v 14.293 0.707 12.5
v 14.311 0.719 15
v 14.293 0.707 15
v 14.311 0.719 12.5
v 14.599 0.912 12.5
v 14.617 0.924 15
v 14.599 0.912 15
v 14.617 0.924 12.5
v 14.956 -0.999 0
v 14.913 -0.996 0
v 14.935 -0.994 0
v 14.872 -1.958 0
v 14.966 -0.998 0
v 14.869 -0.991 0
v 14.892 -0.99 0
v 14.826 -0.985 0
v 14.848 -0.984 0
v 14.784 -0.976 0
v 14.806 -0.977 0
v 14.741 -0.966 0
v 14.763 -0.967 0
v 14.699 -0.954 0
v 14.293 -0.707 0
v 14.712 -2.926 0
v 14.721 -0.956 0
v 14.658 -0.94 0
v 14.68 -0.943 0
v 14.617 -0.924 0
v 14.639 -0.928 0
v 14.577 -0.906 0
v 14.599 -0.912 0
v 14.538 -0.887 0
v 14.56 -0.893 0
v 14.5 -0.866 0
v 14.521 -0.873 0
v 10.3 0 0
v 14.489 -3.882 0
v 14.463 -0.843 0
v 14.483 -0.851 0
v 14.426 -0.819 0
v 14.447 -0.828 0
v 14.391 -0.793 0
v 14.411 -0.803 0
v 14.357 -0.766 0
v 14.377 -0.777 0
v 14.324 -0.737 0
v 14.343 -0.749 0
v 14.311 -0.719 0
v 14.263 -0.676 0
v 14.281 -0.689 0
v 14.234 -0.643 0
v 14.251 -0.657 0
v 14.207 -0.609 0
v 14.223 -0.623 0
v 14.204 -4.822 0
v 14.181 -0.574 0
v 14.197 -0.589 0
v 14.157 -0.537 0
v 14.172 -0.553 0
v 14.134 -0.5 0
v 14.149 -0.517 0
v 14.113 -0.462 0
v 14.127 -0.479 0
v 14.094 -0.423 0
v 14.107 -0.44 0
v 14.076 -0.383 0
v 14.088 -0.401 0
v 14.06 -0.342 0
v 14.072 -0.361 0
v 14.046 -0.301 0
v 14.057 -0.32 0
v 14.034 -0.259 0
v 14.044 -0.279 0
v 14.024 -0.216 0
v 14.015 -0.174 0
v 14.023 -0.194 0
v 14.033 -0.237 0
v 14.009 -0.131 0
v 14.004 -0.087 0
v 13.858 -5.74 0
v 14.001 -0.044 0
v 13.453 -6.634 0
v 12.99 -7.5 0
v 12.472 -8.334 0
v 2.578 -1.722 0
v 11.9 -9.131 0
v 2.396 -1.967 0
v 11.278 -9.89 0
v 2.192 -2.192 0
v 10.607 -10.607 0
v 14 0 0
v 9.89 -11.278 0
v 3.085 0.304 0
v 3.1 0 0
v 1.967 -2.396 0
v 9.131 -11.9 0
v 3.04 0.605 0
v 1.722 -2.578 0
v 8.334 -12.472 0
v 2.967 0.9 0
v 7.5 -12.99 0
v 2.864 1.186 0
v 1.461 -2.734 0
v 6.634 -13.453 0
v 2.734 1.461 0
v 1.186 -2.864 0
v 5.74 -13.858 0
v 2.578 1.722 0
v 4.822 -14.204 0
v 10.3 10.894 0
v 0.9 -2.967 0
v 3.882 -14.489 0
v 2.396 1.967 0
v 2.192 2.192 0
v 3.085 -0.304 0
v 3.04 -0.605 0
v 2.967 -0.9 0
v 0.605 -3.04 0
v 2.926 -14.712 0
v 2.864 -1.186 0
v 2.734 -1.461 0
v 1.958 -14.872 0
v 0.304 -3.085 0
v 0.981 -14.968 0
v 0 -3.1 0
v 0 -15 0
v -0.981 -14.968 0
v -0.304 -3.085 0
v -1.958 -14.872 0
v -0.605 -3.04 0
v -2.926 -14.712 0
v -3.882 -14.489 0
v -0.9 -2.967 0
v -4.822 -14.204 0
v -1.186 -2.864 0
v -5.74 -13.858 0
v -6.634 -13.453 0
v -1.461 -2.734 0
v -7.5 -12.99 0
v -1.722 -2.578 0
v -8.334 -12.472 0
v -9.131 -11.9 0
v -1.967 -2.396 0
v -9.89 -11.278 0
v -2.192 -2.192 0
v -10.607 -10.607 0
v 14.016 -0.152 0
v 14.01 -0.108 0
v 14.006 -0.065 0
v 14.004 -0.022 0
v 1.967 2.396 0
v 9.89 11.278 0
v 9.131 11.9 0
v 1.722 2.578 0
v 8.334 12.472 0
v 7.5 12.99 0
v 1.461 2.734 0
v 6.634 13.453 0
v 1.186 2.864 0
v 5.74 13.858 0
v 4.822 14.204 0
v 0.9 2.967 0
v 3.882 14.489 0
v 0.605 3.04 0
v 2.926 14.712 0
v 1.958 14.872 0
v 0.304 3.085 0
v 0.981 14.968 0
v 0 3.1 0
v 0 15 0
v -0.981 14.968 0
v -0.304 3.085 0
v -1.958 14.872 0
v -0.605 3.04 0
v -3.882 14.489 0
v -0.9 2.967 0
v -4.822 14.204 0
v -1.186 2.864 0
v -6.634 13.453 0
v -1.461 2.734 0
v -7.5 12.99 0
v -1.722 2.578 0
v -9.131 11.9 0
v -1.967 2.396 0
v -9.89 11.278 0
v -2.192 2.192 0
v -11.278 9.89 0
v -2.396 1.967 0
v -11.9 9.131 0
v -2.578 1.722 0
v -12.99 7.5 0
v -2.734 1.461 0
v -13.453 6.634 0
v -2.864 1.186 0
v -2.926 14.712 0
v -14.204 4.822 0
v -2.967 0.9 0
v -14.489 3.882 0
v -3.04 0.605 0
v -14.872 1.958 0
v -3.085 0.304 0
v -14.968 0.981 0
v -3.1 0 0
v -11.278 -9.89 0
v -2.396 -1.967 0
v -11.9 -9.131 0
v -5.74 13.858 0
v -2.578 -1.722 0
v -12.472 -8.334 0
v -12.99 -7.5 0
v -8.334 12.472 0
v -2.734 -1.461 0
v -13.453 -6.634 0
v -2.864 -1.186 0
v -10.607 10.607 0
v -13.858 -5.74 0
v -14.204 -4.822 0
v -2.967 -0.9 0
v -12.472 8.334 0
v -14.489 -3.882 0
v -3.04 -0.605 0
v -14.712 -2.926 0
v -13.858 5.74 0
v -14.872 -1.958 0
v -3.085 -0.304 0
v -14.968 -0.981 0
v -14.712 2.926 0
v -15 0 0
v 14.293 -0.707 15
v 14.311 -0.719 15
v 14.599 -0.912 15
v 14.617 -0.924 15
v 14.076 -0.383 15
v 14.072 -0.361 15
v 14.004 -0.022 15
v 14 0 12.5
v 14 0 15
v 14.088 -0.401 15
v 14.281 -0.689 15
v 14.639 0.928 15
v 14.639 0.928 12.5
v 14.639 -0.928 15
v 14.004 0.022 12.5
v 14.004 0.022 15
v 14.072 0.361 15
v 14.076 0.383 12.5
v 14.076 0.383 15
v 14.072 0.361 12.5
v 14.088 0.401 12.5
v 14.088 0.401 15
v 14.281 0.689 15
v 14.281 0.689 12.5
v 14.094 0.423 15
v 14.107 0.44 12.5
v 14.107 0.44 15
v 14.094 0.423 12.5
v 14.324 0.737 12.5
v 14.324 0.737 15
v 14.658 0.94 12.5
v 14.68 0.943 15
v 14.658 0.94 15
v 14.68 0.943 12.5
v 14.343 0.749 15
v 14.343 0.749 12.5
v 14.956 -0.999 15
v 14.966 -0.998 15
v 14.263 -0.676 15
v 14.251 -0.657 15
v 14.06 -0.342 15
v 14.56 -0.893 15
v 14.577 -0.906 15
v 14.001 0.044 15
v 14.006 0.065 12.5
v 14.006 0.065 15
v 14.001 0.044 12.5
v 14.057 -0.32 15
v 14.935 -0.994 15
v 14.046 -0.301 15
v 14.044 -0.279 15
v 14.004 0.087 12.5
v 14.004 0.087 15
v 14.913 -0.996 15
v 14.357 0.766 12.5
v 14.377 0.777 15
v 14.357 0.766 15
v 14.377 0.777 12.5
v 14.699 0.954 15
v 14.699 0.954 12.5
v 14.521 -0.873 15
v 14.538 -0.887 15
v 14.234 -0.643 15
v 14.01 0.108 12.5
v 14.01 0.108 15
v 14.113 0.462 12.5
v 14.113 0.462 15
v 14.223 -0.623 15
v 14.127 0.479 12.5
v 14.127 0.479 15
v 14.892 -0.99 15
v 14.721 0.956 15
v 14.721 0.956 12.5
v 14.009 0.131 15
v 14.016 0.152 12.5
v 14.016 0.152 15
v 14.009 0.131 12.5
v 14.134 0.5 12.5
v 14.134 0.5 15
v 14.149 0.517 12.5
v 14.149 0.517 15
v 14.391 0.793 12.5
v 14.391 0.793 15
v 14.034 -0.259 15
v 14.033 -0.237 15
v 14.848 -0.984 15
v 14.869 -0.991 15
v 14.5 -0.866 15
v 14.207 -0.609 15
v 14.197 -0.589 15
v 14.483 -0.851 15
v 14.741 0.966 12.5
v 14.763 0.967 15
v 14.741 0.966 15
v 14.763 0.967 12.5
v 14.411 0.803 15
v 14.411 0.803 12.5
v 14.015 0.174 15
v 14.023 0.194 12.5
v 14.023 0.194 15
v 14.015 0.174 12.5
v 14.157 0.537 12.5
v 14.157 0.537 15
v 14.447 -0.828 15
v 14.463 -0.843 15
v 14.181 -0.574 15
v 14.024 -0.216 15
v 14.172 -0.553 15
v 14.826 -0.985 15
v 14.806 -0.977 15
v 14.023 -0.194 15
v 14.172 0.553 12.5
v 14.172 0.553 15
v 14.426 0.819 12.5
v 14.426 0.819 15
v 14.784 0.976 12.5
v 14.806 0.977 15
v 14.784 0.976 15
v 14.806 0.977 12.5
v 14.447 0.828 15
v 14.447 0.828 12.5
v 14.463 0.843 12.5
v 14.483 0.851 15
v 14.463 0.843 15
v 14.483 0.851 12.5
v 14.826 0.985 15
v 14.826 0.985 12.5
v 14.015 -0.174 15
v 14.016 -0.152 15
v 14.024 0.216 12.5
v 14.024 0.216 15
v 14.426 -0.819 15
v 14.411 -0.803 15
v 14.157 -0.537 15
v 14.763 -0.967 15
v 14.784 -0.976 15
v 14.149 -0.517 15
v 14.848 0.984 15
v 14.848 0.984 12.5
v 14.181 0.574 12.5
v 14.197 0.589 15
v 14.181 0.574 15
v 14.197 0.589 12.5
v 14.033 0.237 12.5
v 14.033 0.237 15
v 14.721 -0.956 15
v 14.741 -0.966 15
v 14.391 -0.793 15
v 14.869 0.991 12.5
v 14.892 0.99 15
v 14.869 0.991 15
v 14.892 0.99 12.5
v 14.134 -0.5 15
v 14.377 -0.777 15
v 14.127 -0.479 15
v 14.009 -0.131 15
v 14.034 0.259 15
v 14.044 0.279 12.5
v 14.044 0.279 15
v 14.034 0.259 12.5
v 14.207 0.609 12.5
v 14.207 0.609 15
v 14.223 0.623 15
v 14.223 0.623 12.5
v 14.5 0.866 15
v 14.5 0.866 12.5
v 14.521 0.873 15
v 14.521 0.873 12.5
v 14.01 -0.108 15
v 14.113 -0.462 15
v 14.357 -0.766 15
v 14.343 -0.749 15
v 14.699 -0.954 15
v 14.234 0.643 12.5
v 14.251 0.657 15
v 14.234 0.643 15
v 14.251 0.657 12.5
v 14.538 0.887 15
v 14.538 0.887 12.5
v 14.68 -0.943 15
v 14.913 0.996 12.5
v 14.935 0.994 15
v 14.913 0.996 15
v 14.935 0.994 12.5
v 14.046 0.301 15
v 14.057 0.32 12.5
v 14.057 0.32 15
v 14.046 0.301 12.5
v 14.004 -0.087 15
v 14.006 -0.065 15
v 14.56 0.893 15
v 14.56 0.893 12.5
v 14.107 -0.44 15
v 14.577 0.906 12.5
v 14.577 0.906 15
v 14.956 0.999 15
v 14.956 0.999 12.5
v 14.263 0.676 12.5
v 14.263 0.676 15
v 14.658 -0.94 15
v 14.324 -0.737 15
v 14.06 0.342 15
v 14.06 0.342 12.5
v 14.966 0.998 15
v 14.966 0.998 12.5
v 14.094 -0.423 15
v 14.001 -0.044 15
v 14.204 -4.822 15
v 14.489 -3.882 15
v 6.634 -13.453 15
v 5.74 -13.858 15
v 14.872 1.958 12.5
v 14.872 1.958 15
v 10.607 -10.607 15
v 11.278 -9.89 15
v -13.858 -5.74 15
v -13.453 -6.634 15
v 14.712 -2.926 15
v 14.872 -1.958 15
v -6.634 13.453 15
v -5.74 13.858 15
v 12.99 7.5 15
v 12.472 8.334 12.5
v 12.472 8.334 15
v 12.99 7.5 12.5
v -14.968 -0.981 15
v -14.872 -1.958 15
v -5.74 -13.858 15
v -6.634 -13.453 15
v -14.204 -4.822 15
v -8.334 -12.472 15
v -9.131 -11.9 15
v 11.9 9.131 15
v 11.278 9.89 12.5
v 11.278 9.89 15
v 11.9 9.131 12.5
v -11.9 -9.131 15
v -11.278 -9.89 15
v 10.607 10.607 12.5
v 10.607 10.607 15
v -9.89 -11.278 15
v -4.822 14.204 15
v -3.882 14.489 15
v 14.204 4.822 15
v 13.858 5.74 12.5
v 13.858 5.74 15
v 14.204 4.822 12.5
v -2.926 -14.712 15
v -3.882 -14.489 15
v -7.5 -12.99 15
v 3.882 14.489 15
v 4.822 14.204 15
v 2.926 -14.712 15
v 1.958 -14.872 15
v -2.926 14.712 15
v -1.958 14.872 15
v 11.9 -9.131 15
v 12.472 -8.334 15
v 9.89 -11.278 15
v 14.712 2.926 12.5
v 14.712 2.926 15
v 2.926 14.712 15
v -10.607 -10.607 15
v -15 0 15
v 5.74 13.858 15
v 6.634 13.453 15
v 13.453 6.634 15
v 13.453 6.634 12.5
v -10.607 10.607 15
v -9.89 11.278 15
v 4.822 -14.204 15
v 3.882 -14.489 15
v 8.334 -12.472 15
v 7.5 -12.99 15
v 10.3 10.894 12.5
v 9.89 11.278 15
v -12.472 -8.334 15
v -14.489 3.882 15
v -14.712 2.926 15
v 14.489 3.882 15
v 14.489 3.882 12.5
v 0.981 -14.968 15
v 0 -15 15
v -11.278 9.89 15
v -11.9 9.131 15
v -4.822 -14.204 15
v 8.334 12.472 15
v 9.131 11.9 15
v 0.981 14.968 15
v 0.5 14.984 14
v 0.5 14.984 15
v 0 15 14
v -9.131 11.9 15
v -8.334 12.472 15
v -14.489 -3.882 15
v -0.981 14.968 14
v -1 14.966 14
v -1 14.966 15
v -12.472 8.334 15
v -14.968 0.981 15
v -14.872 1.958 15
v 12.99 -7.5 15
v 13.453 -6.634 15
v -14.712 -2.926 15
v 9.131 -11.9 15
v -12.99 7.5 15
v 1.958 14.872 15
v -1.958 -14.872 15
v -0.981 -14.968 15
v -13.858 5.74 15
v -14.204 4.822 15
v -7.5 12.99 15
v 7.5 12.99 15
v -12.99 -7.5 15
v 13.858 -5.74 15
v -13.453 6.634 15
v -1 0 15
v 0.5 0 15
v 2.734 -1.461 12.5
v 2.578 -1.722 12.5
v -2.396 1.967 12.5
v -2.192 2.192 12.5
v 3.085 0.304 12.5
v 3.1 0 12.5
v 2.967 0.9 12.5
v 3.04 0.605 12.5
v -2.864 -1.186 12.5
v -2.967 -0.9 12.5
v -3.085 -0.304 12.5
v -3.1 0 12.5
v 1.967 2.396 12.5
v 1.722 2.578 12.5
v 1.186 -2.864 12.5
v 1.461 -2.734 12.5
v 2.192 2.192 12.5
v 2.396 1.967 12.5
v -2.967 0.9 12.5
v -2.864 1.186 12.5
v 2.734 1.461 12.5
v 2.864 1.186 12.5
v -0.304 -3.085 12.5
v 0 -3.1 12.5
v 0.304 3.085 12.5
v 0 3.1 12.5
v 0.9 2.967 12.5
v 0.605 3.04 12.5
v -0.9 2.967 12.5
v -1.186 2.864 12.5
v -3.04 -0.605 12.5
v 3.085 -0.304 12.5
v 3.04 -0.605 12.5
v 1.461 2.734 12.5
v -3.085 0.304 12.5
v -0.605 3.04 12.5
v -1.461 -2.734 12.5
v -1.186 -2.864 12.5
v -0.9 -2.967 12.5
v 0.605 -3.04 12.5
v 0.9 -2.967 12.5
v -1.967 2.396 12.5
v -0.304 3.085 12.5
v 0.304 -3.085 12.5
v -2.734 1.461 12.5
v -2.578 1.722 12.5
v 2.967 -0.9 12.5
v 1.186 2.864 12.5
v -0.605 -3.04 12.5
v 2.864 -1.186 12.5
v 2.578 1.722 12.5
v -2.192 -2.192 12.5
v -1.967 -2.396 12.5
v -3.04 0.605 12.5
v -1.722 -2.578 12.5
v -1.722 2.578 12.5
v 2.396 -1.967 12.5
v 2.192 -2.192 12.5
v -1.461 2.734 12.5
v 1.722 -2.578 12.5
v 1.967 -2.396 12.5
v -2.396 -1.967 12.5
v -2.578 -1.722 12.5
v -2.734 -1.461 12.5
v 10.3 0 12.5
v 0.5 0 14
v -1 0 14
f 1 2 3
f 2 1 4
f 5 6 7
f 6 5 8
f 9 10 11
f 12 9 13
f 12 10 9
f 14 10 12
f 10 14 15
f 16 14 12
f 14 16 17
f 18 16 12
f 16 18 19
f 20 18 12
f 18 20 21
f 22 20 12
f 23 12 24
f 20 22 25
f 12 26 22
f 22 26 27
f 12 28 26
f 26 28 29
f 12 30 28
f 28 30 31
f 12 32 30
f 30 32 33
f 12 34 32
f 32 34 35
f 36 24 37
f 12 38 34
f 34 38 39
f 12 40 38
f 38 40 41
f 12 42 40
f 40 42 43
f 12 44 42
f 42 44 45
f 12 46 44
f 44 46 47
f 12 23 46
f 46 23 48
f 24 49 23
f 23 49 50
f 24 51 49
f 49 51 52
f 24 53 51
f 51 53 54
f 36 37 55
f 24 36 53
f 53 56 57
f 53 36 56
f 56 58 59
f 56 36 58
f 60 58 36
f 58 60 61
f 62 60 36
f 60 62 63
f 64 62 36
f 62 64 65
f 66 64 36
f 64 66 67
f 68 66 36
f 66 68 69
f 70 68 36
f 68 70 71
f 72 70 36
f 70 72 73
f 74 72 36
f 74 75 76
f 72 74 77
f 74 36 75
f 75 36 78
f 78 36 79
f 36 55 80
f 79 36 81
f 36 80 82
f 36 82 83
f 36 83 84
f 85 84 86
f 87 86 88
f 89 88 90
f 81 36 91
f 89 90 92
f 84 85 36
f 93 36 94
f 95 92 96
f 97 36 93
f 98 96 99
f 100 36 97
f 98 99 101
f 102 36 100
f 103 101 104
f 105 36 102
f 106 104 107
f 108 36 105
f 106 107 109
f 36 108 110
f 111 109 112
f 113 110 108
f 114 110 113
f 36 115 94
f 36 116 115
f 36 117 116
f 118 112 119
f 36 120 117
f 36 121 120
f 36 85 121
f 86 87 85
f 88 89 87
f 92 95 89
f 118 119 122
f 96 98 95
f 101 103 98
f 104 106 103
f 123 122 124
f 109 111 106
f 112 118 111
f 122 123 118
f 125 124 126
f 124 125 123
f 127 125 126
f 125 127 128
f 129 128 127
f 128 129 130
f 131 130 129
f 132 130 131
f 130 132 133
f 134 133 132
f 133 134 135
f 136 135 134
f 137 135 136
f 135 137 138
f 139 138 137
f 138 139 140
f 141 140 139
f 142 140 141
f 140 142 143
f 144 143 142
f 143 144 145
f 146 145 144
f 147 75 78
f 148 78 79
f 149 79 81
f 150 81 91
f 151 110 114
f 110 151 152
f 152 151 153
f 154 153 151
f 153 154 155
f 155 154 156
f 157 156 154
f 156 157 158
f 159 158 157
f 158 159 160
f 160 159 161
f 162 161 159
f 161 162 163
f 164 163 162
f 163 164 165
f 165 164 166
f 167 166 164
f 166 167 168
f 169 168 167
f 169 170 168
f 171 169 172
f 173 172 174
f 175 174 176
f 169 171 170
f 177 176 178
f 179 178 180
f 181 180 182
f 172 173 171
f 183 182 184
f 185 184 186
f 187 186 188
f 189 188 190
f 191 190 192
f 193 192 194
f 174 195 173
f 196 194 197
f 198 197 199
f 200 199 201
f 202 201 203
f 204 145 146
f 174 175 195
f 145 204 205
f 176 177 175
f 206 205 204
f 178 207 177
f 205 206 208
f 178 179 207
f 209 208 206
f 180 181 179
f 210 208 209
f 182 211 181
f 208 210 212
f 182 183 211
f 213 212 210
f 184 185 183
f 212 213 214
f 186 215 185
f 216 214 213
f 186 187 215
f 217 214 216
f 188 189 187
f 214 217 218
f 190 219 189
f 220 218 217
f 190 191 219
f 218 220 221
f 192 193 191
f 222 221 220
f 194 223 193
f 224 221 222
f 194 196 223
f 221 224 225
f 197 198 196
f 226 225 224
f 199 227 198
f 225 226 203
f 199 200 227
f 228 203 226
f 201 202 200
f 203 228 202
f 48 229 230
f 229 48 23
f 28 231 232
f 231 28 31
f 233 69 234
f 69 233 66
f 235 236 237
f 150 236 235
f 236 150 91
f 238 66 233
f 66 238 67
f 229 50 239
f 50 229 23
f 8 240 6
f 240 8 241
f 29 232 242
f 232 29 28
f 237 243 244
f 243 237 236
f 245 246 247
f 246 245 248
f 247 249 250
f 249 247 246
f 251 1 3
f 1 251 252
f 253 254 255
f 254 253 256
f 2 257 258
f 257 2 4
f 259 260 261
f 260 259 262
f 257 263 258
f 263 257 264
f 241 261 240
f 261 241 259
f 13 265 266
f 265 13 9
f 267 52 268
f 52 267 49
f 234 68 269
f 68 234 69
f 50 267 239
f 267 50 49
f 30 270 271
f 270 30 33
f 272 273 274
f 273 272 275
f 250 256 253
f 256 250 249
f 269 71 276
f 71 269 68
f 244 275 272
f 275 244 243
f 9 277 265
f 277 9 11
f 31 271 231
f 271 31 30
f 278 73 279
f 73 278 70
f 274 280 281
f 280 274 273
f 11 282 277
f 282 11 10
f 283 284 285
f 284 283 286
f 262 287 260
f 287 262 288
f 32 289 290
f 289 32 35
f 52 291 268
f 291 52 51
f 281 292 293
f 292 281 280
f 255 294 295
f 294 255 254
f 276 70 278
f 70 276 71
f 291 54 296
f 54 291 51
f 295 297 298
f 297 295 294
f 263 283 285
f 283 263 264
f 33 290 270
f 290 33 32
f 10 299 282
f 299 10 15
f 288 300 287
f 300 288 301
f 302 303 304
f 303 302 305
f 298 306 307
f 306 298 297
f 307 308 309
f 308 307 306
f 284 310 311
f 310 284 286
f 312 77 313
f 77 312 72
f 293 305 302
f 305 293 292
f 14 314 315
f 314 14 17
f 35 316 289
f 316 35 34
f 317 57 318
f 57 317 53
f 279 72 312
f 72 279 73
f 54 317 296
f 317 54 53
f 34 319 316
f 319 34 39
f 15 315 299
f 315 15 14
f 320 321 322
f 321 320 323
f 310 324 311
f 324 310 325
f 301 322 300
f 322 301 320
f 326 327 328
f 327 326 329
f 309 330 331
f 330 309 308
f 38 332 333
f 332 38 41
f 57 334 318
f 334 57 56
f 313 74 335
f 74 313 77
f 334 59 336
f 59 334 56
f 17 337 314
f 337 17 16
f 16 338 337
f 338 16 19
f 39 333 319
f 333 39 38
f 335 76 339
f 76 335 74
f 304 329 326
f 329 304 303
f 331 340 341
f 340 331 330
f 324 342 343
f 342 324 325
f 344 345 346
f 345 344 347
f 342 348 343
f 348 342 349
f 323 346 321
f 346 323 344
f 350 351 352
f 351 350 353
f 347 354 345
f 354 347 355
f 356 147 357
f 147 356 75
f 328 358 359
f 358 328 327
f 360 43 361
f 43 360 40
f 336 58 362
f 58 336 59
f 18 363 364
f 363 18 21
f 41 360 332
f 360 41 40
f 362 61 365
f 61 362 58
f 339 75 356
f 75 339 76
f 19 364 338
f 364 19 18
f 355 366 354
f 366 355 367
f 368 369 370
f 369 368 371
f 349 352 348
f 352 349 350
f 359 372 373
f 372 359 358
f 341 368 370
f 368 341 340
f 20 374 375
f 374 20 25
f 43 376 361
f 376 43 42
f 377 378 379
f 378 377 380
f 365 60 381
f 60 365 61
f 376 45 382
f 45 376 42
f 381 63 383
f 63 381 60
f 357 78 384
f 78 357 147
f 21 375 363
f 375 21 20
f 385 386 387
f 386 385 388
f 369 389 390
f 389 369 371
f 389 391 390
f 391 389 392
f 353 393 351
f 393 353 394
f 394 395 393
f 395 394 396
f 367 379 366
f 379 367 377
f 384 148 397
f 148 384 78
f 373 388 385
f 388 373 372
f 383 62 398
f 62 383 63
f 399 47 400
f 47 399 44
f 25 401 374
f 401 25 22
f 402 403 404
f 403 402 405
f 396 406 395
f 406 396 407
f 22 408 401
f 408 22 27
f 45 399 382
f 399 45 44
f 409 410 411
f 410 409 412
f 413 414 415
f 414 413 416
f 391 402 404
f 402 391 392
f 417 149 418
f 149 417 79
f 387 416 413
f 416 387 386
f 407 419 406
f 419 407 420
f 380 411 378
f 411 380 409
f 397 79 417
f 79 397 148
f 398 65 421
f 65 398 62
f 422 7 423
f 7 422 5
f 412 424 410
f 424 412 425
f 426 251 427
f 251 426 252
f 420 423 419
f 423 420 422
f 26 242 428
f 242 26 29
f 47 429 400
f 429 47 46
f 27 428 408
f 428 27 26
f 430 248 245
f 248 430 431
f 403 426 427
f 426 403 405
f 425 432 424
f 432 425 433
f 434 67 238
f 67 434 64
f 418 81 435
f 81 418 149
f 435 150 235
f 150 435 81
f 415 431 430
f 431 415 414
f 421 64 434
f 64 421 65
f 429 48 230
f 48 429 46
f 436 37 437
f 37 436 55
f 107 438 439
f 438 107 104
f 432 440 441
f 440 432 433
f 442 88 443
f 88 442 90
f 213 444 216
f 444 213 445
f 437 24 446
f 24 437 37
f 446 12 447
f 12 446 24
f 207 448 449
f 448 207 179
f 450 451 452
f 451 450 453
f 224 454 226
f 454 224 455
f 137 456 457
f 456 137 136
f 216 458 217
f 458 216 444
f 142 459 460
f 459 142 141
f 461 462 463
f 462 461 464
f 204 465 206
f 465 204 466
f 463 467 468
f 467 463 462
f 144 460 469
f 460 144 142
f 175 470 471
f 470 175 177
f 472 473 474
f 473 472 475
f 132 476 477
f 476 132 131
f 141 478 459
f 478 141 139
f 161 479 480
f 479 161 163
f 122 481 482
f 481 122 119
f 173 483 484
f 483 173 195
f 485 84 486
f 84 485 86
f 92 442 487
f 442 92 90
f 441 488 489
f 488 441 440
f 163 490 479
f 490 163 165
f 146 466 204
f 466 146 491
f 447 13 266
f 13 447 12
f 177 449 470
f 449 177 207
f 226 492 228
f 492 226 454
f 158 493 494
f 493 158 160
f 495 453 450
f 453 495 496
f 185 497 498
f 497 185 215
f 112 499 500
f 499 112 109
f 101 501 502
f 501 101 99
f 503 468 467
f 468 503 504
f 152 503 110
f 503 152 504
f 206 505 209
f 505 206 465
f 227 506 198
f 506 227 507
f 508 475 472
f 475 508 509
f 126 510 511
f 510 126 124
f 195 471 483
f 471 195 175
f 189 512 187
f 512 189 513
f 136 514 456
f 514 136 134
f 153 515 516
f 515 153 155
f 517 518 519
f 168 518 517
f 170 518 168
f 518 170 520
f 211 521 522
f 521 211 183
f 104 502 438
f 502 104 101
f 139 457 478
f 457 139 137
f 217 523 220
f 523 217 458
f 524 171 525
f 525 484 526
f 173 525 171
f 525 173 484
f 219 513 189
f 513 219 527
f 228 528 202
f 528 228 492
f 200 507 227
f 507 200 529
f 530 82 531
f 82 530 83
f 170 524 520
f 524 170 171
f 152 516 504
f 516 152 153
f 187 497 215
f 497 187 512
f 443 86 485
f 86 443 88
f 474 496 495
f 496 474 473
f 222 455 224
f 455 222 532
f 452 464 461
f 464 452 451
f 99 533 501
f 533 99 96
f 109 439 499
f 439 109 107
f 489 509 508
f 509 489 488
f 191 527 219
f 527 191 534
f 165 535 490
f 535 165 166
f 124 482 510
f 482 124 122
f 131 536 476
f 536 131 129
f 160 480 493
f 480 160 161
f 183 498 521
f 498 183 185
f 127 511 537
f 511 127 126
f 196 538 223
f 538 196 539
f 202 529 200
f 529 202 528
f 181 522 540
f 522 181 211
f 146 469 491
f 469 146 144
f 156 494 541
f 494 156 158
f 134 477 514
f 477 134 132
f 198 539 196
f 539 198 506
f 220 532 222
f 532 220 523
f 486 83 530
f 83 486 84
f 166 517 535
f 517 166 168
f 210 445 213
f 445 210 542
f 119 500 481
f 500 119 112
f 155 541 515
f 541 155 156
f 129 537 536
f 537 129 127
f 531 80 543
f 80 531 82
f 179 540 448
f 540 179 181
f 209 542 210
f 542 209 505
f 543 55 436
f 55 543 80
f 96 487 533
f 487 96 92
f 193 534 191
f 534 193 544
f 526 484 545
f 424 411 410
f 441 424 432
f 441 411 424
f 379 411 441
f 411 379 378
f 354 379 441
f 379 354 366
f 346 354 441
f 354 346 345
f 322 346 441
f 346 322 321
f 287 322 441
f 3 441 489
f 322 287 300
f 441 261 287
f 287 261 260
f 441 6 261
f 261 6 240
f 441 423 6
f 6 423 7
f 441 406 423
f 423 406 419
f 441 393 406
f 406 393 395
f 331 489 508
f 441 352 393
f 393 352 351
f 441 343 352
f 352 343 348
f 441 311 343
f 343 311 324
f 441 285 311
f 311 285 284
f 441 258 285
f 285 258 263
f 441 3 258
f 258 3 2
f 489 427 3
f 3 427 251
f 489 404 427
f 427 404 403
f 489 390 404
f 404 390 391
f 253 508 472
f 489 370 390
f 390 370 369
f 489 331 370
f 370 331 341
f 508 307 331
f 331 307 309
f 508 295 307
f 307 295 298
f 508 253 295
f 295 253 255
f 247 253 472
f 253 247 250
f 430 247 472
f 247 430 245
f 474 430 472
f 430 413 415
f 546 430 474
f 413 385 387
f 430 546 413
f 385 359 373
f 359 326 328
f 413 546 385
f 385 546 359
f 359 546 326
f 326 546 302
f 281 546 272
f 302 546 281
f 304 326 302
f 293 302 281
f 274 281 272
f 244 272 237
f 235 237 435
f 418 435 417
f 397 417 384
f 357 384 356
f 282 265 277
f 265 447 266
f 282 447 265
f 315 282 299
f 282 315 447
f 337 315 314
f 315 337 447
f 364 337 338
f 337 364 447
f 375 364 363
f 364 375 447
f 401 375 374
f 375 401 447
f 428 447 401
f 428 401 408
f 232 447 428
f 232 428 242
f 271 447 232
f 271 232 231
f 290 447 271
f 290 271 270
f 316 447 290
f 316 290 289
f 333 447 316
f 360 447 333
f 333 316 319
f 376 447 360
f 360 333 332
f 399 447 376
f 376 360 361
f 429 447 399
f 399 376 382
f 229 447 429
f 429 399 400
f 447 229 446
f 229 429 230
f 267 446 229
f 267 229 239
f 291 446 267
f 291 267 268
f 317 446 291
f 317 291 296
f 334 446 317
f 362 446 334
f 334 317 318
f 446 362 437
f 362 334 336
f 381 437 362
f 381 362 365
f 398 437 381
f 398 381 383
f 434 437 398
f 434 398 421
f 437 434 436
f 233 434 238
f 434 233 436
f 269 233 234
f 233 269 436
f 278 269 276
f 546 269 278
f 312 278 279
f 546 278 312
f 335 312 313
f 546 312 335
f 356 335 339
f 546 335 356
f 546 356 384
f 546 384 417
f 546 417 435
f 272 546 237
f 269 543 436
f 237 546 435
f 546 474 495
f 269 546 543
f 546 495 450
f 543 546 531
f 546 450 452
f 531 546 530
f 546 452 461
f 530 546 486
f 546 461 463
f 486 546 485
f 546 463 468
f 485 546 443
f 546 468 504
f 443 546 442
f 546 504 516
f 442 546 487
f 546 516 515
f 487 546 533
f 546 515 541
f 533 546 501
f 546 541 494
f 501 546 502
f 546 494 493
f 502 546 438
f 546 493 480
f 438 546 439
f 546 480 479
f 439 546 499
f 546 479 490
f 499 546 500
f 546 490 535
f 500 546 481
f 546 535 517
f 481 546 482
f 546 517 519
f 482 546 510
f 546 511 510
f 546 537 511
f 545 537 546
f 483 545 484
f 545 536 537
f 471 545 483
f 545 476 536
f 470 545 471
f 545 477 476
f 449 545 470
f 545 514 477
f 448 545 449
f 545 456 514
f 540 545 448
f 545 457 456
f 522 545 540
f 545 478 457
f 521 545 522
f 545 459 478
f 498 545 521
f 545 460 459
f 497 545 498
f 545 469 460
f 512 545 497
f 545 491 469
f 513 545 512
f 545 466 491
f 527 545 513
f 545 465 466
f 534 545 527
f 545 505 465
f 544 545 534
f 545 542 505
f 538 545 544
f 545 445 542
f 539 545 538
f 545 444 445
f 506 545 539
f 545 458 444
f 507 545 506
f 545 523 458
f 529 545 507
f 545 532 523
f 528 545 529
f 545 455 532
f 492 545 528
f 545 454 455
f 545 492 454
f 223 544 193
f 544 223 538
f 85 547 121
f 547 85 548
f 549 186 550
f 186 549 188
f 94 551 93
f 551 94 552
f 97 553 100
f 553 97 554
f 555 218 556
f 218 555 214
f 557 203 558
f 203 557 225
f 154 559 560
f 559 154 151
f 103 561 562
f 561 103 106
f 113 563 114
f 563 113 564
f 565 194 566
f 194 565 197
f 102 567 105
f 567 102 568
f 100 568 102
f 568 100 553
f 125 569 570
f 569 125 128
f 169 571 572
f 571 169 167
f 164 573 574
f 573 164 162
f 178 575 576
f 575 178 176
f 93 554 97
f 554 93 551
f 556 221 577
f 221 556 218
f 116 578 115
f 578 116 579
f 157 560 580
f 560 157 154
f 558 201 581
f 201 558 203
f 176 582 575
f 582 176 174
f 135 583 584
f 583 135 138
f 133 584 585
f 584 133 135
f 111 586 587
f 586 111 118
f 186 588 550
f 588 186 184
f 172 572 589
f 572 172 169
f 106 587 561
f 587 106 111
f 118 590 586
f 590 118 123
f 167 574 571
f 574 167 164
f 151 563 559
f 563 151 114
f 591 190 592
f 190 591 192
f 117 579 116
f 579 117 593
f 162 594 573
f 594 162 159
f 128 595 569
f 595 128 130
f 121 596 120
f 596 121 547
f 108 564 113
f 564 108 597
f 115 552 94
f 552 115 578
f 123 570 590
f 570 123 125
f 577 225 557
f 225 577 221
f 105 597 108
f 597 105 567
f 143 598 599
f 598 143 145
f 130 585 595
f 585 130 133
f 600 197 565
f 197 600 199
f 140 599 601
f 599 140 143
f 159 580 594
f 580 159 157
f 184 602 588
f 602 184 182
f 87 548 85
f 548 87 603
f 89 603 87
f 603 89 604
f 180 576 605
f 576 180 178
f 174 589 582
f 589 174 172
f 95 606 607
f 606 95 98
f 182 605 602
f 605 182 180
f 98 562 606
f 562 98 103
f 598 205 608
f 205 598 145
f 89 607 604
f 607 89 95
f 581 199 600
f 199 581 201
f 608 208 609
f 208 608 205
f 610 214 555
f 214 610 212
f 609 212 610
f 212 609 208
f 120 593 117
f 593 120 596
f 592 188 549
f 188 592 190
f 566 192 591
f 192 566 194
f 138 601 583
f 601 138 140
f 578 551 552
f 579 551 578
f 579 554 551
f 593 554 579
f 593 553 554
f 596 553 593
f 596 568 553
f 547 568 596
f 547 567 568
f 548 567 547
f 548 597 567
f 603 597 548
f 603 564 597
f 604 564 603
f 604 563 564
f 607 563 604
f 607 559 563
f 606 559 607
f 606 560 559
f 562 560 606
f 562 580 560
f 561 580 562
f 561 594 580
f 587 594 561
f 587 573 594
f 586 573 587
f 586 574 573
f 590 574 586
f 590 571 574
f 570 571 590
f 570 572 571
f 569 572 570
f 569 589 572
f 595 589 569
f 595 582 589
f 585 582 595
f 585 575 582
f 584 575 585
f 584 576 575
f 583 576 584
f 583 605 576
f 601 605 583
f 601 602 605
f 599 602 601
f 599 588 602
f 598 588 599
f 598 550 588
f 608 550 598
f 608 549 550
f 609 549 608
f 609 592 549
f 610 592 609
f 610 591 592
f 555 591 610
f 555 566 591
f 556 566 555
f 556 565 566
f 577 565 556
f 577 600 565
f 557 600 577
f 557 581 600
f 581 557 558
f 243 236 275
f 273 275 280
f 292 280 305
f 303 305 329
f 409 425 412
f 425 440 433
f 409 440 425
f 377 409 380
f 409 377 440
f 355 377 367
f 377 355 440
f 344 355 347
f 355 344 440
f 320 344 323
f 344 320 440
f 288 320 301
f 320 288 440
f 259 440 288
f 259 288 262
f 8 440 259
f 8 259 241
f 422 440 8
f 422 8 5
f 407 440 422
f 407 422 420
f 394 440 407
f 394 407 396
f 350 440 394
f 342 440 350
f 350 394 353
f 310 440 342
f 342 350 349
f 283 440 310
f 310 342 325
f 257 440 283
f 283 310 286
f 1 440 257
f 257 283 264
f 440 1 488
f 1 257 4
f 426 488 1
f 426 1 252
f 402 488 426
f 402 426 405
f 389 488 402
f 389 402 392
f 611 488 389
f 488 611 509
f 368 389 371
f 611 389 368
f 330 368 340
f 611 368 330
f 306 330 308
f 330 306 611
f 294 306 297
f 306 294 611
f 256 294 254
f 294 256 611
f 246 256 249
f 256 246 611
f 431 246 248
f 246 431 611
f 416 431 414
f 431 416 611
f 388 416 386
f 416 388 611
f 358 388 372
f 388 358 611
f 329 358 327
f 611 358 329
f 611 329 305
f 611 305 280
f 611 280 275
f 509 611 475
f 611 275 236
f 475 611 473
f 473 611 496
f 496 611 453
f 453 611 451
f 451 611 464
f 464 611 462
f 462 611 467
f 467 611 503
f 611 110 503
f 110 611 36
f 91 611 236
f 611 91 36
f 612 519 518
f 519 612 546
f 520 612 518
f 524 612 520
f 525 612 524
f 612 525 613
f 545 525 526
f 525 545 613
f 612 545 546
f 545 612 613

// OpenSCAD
// Replacement knob for hotplate stirrer with a 6 mm D-shaft
// Print orientation: side that faces the hotplate down on the bed (z = 0)

// ---------------- Parameters ----------------
knob_d        = 30;    // knob outer diameter
knob_h        = 15;    // knob height
bore_depth    = 12;    // D-shaped blind bore depth from bottom face
shaft_d       = 6.2;   // D-shaft diameter (circle diameter)
flat_to_curve = 4.7;   // distance from flat side of D to opposite circle side
groove_count  = 18;    // number of vertical grip grooves
groove_d      = 2;     // groove diameter (half-cylinder)
pointer_w     = 1.5;   // pointer groove width
pointer_d     = 1;     // pointer groove depth
eps           = 0.5;   // cutter overshoot past faces

$fn = 96;

// ---------------- Model ----------------
difference() {
    // Main knob body
    cylinder(d = knob_d, h = knob_h);

    // D-shaped blind bore from bottom face
    translate([0, 0, -eps])
        cylinder(d = shaft_d, h = bore_depth + 2 * eps, $fn = 64);

    // Flat side of D bore (cut into the cylinder along +X)
    translate([knob_d / 2 - flat_to_curve, 0, -eps])
        cube([flat_to_curve, knob_d, bore_depth + 2 * eps]);

    // Vertical grip grooves around full height, centred on outer surface
    for (i = [0 : groove_count - 1]) {
        a = (i - groove_count / 2) * 360 / groove_count;
        translate([knob_d / 2, 0, 0])
            rotate([0, 0, a])
                cylinder(d = groove_d, h = knob_h + 2 * eps, $fn = 16);
    }

    // Pointer groove on top face, same side as D flat (along +X)
    translate([-pointer_d, 0, knob_h - pointer_d])
        cube([pointer_w, knob_d + 2 * pointer_d, pointer_d + eps]);
}
